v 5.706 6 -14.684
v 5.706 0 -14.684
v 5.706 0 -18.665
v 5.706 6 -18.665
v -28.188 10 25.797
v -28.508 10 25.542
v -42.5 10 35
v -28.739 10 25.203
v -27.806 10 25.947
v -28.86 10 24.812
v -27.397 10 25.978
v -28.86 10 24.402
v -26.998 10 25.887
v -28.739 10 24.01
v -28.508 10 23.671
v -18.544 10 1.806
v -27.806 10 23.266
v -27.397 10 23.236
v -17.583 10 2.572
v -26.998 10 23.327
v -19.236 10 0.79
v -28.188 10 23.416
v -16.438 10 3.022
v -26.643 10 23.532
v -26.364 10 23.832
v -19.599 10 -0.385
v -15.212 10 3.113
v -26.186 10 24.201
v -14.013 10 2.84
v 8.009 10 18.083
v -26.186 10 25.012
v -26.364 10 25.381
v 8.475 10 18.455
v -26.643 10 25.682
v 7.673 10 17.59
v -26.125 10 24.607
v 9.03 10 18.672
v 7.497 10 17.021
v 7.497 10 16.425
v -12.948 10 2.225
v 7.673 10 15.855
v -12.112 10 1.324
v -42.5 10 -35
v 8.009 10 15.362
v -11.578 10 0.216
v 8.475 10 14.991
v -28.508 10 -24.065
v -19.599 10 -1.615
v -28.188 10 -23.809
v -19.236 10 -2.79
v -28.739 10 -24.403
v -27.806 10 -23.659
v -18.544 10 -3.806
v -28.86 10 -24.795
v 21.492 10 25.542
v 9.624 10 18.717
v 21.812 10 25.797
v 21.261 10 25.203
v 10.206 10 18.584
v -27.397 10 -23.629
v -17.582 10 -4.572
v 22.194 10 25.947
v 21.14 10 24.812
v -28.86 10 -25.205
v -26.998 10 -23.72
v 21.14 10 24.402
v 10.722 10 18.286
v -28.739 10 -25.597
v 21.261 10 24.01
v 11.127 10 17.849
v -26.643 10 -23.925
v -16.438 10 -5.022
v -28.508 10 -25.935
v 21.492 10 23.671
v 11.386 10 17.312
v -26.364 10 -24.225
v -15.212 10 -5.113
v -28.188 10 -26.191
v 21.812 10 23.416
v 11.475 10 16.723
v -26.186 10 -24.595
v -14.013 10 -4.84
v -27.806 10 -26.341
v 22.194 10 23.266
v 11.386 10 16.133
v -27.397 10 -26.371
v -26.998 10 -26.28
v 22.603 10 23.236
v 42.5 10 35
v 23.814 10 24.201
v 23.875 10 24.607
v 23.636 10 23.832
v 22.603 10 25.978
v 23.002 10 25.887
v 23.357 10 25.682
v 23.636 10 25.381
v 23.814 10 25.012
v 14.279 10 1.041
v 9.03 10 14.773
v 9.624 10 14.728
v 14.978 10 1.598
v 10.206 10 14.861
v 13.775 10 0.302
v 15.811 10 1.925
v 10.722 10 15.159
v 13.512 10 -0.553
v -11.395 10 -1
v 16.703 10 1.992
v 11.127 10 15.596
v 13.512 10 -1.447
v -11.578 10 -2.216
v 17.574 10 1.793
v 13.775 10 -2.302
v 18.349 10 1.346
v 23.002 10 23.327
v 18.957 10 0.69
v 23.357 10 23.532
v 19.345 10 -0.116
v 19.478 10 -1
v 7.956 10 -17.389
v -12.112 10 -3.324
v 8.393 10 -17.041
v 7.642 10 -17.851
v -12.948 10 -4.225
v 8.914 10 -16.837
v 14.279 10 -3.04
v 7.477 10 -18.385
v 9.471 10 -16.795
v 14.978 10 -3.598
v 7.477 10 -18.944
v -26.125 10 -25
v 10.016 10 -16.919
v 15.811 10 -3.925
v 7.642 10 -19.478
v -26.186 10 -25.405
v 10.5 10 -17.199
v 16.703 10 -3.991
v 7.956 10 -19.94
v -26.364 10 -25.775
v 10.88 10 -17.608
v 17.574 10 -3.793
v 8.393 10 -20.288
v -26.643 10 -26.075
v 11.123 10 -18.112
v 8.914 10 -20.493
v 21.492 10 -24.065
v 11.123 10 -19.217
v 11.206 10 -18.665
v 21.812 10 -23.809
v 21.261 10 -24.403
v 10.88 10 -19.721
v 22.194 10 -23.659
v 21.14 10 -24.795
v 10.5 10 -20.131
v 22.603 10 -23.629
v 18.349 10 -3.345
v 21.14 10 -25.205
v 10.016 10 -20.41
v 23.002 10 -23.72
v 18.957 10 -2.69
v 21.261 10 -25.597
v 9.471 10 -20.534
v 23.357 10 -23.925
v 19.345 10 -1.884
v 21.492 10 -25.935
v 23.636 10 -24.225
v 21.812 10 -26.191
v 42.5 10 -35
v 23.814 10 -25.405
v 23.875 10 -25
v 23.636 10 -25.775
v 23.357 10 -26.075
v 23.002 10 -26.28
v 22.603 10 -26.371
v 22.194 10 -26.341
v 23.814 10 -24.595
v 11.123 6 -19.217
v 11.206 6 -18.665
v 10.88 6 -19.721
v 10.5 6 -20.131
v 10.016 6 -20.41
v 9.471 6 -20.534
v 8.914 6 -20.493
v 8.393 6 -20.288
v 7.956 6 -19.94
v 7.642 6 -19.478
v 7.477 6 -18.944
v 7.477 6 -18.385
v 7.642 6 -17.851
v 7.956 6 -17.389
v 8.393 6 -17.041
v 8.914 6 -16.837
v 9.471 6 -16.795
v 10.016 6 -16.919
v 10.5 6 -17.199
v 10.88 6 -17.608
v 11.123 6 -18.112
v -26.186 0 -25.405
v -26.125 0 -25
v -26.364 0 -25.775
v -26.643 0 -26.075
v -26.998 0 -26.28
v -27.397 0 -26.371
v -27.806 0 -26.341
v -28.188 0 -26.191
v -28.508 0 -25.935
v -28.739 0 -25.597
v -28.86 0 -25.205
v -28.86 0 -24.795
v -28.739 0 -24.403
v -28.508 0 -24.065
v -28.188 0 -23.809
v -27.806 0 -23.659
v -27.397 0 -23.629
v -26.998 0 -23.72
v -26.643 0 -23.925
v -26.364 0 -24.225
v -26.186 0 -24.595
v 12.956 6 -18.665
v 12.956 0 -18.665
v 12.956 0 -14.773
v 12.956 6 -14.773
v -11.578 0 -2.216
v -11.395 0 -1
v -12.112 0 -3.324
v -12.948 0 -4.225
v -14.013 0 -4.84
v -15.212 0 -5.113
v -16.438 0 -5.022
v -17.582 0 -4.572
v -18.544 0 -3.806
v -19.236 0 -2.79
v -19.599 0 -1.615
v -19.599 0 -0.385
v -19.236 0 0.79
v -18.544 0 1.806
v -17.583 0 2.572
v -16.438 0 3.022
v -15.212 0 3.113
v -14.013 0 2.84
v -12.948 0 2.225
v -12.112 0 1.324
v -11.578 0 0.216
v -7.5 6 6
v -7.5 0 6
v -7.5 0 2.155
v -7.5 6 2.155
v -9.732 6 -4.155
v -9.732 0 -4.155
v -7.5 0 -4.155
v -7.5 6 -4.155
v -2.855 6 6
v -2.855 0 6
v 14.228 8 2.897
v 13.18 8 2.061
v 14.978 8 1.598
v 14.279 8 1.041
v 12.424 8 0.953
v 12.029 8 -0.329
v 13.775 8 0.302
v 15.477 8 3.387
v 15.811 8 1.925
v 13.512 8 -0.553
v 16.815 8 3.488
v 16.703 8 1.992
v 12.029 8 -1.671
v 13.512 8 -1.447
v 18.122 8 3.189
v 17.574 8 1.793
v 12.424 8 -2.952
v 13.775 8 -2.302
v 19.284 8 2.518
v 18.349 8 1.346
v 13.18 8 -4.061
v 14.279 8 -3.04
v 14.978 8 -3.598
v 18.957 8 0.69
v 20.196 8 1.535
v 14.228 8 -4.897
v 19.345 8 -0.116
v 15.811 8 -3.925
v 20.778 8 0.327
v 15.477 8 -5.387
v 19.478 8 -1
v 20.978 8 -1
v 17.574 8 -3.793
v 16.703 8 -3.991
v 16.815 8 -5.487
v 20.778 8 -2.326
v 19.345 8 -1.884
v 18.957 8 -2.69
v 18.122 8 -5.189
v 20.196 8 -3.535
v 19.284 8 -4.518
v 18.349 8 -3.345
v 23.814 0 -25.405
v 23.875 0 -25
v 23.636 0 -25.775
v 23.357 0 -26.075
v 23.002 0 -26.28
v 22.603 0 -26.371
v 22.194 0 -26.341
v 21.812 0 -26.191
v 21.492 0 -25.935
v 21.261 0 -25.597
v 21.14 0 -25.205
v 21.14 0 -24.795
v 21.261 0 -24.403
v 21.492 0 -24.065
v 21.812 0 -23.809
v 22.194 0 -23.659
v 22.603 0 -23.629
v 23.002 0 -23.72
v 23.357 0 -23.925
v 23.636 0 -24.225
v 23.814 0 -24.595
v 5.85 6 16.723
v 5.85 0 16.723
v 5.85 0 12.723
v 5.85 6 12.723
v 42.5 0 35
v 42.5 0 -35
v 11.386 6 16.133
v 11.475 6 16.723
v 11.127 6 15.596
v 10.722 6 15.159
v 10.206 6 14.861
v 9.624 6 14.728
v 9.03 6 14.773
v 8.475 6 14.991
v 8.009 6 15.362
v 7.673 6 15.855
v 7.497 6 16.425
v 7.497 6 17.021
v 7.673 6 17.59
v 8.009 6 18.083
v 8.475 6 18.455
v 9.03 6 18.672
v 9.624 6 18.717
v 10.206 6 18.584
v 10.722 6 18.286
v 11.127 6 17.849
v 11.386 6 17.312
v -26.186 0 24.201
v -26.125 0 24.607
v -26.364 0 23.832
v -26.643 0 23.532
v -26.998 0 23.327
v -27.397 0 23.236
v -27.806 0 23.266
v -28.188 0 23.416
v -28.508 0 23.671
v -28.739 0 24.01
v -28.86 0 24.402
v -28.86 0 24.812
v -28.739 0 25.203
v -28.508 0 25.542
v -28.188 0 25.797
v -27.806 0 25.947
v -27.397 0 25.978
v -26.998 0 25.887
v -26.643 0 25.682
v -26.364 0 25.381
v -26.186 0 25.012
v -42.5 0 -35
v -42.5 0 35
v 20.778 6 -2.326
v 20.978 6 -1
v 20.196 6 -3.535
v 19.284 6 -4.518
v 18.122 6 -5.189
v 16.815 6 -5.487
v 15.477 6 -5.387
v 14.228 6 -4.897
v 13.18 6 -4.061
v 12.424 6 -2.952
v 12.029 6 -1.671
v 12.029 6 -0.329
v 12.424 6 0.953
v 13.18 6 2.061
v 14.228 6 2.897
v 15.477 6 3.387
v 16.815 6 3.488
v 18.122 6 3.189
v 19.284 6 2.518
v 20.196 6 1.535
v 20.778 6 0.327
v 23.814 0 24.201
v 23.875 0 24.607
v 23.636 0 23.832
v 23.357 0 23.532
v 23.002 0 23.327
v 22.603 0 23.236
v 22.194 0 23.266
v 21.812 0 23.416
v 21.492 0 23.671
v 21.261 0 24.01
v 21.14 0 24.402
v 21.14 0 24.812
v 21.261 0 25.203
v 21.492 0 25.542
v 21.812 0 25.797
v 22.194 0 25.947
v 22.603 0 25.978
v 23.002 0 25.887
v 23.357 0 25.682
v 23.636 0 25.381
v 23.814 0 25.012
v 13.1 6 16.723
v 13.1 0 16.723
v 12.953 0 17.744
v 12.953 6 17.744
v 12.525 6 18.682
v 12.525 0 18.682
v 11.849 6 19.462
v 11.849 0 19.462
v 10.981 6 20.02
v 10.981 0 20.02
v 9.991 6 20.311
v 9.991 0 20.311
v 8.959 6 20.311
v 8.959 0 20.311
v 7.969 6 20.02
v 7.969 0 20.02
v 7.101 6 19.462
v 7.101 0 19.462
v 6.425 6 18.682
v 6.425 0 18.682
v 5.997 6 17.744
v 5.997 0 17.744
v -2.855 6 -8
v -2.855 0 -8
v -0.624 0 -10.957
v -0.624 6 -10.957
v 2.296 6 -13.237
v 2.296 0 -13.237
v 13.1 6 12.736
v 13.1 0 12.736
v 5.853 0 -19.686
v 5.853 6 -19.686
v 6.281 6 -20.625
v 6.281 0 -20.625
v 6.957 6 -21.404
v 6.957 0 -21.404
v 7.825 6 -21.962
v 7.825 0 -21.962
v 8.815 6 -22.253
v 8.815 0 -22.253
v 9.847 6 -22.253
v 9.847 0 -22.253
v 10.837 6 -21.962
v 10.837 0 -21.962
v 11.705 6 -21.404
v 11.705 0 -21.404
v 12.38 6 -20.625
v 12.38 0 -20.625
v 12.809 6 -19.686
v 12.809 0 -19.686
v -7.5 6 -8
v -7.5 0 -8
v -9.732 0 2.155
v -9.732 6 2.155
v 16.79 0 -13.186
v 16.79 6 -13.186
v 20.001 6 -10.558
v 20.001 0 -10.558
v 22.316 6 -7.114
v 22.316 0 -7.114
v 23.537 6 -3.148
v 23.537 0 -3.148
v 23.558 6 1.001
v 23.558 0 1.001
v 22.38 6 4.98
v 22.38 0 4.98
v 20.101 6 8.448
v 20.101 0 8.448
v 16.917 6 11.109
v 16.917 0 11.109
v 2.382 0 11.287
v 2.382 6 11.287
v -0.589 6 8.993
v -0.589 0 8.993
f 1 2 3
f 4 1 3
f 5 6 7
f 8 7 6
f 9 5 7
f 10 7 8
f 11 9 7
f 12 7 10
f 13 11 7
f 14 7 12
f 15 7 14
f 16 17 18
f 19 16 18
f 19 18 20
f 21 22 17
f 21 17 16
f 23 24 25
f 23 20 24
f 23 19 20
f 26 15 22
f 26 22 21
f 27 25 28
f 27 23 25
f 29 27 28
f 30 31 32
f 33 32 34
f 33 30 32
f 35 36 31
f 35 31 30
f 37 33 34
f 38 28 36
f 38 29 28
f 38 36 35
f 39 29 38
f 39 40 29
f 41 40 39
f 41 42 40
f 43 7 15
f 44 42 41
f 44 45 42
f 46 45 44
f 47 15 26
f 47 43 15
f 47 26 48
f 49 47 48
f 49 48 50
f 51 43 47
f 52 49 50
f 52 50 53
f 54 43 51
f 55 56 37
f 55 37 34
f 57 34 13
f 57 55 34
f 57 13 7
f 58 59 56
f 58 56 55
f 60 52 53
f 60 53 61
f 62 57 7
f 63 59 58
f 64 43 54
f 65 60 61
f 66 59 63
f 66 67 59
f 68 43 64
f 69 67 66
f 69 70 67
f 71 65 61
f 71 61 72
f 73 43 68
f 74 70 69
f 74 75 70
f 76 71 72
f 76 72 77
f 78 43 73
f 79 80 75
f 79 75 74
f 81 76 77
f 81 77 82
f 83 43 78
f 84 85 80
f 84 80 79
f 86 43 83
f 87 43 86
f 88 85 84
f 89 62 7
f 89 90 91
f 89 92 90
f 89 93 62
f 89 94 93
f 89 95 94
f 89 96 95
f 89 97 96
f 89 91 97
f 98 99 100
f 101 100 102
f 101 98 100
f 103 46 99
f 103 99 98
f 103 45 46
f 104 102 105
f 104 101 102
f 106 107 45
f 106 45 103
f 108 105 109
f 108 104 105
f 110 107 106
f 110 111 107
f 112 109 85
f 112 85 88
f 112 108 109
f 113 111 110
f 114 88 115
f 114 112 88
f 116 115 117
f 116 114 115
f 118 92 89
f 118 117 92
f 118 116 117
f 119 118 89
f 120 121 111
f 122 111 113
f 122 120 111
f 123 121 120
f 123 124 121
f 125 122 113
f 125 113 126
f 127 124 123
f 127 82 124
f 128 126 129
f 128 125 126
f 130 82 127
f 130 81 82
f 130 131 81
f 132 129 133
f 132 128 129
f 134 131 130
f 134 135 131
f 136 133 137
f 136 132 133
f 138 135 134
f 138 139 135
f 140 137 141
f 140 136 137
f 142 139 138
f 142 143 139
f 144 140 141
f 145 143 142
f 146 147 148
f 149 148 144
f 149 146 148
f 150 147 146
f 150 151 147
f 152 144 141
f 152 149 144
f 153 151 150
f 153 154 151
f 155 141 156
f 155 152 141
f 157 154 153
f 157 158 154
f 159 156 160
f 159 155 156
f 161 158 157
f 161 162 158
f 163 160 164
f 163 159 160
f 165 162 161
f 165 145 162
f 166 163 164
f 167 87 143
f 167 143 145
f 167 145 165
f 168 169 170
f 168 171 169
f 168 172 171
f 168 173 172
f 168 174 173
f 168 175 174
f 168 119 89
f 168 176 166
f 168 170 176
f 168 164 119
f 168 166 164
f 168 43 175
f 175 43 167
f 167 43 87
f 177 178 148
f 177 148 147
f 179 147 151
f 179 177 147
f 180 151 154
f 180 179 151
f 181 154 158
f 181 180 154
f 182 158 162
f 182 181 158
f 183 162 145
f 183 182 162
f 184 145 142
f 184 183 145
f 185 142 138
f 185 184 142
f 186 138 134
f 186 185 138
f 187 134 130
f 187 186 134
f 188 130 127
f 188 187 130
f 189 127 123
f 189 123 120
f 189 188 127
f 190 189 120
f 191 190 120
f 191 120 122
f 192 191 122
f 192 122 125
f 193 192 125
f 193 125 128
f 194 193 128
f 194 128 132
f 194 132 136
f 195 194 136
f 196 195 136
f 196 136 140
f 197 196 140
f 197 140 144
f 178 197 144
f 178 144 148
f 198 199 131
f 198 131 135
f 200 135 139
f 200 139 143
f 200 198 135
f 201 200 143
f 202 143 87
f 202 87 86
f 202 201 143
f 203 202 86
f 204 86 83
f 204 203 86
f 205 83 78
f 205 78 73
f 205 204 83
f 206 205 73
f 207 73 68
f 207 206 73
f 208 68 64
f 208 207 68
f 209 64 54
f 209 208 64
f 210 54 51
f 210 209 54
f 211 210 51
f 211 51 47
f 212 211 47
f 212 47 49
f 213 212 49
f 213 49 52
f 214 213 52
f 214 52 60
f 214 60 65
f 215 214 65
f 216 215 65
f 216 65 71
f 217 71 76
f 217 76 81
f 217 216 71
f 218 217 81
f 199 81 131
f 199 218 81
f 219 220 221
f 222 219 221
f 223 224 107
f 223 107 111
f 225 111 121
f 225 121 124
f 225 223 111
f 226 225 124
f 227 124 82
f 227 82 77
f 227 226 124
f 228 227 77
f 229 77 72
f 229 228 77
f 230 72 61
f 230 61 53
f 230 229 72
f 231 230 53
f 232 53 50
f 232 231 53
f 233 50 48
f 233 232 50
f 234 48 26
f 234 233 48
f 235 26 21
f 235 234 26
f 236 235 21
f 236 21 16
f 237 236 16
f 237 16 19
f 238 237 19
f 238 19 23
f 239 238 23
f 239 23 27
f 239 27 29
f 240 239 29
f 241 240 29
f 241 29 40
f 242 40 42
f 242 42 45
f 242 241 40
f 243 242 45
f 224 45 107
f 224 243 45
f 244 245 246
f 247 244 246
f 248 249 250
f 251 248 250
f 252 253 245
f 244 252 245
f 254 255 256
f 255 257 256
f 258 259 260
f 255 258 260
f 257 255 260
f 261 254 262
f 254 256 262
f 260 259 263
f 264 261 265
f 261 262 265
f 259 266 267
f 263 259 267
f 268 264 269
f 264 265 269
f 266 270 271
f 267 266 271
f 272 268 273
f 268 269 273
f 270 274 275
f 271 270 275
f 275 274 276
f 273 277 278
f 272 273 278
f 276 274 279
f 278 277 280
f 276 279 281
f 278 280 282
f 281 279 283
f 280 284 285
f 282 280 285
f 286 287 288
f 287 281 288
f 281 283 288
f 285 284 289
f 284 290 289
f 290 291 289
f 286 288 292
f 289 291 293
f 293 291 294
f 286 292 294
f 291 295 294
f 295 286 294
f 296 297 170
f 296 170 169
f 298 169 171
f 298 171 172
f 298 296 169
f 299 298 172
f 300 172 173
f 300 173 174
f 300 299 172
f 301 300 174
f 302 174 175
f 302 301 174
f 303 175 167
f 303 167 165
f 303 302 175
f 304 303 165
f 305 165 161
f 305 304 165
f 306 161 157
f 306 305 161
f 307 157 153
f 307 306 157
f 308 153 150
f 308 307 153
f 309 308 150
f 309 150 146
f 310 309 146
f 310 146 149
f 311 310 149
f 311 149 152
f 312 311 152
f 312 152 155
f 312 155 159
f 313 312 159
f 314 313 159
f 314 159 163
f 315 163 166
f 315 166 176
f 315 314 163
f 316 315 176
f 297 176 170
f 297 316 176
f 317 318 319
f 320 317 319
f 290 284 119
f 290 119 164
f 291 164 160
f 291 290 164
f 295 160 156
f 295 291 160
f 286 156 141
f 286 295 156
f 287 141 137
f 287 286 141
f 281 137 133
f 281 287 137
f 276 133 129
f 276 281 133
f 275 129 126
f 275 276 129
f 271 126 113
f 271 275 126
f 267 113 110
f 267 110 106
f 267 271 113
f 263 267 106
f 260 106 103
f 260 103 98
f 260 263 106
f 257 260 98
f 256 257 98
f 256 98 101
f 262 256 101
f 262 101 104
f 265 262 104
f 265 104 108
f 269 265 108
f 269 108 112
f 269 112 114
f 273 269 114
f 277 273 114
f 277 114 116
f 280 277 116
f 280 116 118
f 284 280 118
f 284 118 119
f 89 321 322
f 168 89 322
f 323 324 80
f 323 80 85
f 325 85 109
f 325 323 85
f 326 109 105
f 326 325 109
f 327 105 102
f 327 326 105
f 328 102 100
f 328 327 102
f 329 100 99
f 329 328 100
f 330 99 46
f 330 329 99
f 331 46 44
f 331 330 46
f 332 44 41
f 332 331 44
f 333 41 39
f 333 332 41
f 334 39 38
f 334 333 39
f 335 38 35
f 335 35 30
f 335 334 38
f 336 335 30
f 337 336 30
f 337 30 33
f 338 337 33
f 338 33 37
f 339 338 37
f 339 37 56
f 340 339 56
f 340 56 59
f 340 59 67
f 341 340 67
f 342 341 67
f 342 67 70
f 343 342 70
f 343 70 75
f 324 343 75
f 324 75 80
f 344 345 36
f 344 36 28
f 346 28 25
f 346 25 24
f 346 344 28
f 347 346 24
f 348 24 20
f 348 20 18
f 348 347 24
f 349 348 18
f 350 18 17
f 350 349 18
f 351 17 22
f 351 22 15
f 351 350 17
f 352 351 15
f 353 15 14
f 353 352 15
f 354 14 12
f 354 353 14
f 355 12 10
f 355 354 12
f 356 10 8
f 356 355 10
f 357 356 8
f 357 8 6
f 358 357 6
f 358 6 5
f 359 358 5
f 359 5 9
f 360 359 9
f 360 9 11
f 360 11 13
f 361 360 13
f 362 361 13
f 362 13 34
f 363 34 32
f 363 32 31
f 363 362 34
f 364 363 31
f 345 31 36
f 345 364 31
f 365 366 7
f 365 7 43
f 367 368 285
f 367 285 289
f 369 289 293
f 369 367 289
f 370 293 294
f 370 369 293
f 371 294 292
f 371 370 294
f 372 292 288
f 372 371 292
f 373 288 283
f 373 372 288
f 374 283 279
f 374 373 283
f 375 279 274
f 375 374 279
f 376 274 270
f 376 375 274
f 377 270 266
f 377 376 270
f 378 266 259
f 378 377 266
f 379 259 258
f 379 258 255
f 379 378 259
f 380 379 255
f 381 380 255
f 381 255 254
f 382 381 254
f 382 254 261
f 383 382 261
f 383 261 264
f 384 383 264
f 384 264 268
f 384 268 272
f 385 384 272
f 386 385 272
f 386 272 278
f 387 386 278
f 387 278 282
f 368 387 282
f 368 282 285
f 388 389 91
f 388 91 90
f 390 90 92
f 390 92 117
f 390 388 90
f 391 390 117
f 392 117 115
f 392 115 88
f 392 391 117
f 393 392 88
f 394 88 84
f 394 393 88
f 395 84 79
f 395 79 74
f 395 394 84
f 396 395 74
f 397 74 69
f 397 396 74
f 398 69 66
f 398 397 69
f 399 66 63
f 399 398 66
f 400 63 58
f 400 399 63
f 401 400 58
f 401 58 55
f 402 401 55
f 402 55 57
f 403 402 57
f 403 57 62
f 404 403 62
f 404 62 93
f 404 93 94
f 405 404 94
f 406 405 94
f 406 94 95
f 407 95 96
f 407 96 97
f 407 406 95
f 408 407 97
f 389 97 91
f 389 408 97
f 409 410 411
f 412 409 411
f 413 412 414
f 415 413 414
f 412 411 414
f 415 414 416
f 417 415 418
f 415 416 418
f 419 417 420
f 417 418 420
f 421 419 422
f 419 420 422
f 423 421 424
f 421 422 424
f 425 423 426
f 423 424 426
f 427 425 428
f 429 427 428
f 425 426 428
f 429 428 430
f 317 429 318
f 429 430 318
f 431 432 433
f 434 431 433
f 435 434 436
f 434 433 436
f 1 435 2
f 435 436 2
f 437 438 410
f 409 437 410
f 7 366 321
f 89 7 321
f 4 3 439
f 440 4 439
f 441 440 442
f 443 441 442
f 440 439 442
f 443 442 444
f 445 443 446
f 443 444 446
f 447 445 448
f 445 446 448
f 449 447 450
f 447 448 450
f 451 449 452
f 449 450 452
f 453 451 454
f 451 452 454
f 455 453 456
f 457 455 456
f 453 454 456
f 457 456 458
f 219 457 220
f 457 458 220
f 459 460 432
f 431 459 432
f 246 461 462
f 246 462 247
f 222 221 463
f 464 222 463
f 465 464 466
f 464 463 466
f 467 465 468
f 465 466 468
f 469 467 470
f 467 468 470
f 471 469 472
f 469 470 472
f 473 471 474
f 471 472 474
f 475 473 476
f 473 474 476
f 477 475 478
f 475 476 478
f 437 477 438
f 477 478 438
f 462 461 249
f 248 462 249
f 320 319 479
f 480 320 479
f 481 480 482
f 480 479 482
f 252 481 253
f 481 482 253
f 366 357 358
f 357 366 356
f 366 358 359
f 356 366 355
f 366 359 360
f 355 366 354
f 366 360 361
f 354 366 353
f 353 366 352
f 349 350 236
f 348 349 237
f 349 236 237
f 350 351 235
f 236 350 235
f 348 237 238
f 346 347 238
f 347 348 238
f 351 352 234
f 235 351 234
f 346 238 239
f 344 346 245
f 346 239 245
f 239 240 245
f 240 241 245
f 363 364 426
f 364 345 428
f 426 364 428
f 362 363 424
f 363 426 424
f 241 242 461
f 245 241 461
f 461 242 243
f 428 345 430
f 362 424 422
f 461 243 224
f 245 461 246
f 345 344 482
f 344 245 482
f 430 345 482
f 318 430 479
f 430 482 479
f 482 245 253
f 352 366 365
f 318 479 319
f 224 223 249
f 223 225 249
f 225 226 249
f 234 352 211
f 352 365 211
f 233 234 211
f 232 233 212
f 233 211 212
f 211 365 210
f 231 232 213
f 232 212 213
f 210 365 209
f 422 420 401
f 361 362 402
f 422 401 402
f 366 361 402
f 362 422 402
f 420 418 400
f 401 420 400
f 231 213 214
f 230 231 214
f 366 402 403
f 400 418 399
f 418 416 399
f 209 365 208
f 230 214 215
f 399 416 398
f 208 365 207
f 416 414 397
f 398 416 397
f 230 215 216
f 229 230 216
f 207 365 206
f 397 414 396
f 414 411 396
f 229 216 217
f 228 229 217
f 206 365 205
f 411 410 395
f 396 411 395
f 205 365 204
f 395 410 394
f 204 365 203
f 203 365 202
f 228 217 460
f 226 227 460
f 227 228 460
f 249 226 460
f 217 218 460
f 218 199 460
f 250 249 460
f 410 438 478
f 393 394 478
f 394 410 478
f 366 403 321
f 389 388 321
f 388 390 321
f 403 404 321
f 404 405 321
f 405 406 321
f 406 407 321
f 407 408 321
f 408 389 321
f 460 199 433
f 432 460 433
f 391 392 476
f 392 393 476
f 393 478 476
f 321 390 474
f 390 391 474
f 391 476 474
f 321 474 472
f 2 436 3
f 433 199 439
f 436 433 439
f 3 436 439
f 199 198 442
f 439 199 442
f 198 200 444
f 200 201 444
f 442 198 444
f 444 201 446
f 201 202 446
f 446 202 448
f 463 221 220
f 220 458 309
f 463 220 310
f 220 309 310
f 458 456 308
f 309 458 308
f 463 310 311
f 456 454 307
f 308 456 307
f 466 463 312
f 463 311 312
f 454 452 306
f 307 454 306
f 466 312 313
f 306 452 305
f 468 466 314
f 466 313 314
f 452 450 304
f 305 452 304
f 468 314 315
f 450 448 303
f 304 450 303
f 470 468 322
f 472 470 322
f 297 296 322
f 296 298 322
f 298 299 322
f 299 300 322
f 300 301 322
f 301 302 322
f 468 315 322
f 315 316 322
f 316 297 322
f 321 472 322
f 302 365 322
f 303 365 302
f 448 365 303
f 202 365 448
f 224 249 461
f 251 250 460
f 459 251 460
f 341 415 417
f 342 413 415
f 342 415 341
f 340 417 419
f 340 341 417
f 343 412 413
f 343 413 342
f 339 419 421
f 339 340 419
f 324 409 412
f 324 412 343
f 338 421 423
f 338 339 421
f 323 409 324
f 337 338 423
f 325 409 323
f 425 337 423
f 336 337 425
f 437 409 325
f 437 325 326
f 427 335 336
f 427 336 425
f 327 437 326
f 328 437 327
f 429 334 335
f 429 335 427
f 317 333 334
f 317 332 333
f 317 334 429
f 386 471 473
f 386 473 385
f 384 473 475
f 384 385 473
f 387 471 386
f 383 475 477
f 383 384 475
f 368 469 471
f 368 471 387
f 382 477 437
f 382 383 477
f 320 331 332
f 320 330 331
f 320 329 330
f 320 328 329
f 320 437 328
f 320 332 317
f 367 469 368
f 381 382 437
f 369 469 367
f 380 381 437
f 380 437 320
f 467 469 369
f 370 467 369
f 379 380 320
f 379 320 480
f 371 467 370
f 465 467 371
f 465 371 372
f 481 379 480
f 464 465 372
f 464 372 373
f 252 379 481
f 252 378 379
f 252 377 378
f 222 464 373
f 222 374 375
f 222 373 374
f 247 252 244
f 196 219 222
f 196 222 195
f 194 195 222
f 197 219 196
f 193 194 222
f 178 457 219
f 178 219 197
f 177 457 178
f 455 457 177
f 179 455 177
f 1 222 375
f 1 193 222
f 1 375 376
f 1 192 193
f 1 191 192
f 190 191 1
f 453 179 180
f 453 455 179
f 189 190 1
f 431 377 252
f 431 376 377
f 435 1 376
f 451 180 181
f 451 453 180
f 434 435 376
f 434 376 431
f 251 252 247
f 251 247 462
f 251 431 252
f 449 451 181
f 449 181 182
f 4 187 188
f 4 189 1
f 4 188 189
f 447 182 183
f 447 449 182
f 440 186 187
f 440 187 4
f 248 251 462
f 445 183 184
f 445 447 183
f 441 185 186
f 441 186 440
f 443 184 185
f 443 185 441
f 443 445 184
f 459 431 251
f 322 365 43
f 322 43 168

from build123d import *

# Parameters (mm, degrees)
SKETCH1_W           = 85
SKETCH1_H           = 70
SKETCH1_R           = 1.375
SKETCH1_R_2         = 1.875
SKETCH1_R_3         = 2
SKETCH1_W_2         = 2.231847436
SKETCH1_H_2         = 6.309819942
SKETCH1_R_4         = 4.125
SKETCH1_R_5         = 3
BOSS_EXTRUDE4_DEPTH = 10
SKETCH1_7_R         = 4.5
CUT_EXTRUDE2_DEPTH  = 6
SKETCH1_9_R         = 2
SKETCH1_9_R_2       = 1.875
SKETCH1_9_R_3       = 4.5
CUT_EXTRUDE6_DEPTH  = 6
SKETCH1_11_R        = 4.5
SKETCH1_11_R_2      = 3
CUT_EXTRUDE10_DEPTH = 8
SKETCH5_W           = 2.231847436
SKETCH5_H           = 6.309819942
BOSS_EXTRUDE5_DEPTH = 4


with BuildPart() as part:
    # Sketch1 → Boss-Extrude4 (new body)
    with BuildSketch(Plane(origin=(0, 0, 0), x_dir=(1, 0, 0), z_dir=(0, 1, 0))):
        Rectangle(SKETCH1_W, SKETCH1_H)
        with Locations((-27.5, -24.60667729)):
            Circle(SKETCH1_R, mode=Mode.SUBTRACT)
        with Locations((22.5, -24.60667729)):
            Circle(SKETCH1_R, mode=Mode.SUBTRACT)
        with Locations((-27.5, 25)):
            Circle(SKETCH1_R, mode=Mode.SUBTRACT)
        with Locations((22.5, 25)):
            Circle(SKETCH1_R, mode=Mode.SUBTRACT)
        with Locations((9.330885495, 18.664687396)):
            Circle(SKETCH1_R_2, mode=Mode.SUBTRACT)
        with Locations((9.474989645, -16.722600152)):
            Circle(SKETCH1_R_3, mode=Mode.SUBTRACT)
        with Locations((-8.615923718, 1)):
            Rectangle(SKETCH1_W_2, SKETCH1_H_2, mode=Mode.SUBTRACT)
        with Locations((-15.52, 1)):
            Circle(SKETCH1_R_4, mode=Mode.SUBTRACT)
        with Locations((16.478339488, 0.999882702)):
            Circle(SKETCH1_R_5, mode=Mode.SUBTRACT)
    extrude(amount=BOSS_EXTRUDE4_DEPTH)

    # Sketch1<7> → Cut-Extrude2 (cut)
    with BuildSketch(Plane(origin=(0, 0, 0), x_dir=(1, 0, 0), z_dir=(0, 1, 0))):
        with Locations((16.478339488, 0.999882702)):
            Circle(SKETCH1_7_R)
    extrude(amount=CUT_EXTRUDE2_DEPTH, mode=Mode.SUBTRACT)

    # Sketch1<9> → Cut-Extrude6 (cut)
    with BuildSketch(Plane(origin=(0, 0, 0), x_dir=(1, 0, 0), z_dir=(0, 1, 0))):
        with BuildLine():
            Line((12.955885495, 14.773048154), (12.955885495, 18.664687396))
            ThreePointArc((12.955885495, 18.664687396), (9.330885495, 22.289687396), (5.705885495, 18.664687396))
            Line((5.705885495, 18.664687396), (5.705885495, 14.683738346))
            ThreePointArc((5.705885495, 14.683738346), (0.761316141, 12.192649571), (-2.854756169, 8))
            Line((-2.854756169, 8), (-7.5, 8))
            Line((-7.5, 8), (-7.5, 4.154909971))
            Line((-7.5, 4.154909971), (-9.731847436, 4.154909971))
            Line((-9.731847436, 4.154909971), (-9.731847436, -2.154909971))
            Line((-9.731847436, -2.154909971), (-7.5, -2.154909971))
            Line((-7.5, -2.154909971), (-7.5, -6))
            Line((-7.5, -6), (-2.854756169, -6))
            ThreePointArc((-2.854756169, -6), (0.820287137, -10.238442268), (5.849989645, -12.722879596))
            Line((5.849989645, -12.722879596), (5.849989645, -16.722600152))
            ThreePointArc((5.849989645, -16.722600152), (9.474989645, -20.347600152), (13.099989645, -16.722600152))
            Line((13.099989645, -16.722600152), (13.099989645, -12.736086581))
            ThreePointArc((13.099989645, -12.736086581), (23.699805173, 1.074384413), (12.955885495, 14.773048154))
        make_face()
        with Locations((9.474989645, -16.722600152)):
            Circle(SKETCH1_9_R, mode=Mode.SUBTRACT)
        with Locations((9.330885495, 18.664687396)):
            Circle(SKETCH1_9_R_2, mode=Mode.SUBTRACT)
        with Locations((16.478339488, 0.999882702)):
            Circle(SKETCH1_9_R_3, mode=Mode.SUBTRACT)
    extrude(amount=CUT_EXTRUDE6_DEPTH, mode=Mode.SUBTRACT)

    # Sketch1<11> → Cut-Extrude10 (cut)
    with BuildSketch(Plane(origin=(0, 0, 0), x_dir=(1, 0, 0), z_dir=(0, 1, 0))):
        with Locations((16.478339488, 0.999882702)):
            Circle(SKETCH1_11_R)
        with Locations((16.478339488, 0.999882702)):
            Circle(SKETCH1_11_R_2, mode=Mode.SUBTRACT)
    extrude(amount=CUT_EXTRUDE10_DEPTH, mode=Mode.SUBTRACT)

    # Sketch5 → Boss-Extrude5 (add)
    with BuildSketch(Plane(origin=(0, 10, 0), x_dir=(1, 0, 0), z_dir=(0, 1, 0))):
        with Locations((-8.615923718, 1)):
            Rectangle(SKETCH5_W, SKETCH5_H)
    extrude(amount=-BOSS_EXTRUDE5_DEPTH)


solid = part.part
